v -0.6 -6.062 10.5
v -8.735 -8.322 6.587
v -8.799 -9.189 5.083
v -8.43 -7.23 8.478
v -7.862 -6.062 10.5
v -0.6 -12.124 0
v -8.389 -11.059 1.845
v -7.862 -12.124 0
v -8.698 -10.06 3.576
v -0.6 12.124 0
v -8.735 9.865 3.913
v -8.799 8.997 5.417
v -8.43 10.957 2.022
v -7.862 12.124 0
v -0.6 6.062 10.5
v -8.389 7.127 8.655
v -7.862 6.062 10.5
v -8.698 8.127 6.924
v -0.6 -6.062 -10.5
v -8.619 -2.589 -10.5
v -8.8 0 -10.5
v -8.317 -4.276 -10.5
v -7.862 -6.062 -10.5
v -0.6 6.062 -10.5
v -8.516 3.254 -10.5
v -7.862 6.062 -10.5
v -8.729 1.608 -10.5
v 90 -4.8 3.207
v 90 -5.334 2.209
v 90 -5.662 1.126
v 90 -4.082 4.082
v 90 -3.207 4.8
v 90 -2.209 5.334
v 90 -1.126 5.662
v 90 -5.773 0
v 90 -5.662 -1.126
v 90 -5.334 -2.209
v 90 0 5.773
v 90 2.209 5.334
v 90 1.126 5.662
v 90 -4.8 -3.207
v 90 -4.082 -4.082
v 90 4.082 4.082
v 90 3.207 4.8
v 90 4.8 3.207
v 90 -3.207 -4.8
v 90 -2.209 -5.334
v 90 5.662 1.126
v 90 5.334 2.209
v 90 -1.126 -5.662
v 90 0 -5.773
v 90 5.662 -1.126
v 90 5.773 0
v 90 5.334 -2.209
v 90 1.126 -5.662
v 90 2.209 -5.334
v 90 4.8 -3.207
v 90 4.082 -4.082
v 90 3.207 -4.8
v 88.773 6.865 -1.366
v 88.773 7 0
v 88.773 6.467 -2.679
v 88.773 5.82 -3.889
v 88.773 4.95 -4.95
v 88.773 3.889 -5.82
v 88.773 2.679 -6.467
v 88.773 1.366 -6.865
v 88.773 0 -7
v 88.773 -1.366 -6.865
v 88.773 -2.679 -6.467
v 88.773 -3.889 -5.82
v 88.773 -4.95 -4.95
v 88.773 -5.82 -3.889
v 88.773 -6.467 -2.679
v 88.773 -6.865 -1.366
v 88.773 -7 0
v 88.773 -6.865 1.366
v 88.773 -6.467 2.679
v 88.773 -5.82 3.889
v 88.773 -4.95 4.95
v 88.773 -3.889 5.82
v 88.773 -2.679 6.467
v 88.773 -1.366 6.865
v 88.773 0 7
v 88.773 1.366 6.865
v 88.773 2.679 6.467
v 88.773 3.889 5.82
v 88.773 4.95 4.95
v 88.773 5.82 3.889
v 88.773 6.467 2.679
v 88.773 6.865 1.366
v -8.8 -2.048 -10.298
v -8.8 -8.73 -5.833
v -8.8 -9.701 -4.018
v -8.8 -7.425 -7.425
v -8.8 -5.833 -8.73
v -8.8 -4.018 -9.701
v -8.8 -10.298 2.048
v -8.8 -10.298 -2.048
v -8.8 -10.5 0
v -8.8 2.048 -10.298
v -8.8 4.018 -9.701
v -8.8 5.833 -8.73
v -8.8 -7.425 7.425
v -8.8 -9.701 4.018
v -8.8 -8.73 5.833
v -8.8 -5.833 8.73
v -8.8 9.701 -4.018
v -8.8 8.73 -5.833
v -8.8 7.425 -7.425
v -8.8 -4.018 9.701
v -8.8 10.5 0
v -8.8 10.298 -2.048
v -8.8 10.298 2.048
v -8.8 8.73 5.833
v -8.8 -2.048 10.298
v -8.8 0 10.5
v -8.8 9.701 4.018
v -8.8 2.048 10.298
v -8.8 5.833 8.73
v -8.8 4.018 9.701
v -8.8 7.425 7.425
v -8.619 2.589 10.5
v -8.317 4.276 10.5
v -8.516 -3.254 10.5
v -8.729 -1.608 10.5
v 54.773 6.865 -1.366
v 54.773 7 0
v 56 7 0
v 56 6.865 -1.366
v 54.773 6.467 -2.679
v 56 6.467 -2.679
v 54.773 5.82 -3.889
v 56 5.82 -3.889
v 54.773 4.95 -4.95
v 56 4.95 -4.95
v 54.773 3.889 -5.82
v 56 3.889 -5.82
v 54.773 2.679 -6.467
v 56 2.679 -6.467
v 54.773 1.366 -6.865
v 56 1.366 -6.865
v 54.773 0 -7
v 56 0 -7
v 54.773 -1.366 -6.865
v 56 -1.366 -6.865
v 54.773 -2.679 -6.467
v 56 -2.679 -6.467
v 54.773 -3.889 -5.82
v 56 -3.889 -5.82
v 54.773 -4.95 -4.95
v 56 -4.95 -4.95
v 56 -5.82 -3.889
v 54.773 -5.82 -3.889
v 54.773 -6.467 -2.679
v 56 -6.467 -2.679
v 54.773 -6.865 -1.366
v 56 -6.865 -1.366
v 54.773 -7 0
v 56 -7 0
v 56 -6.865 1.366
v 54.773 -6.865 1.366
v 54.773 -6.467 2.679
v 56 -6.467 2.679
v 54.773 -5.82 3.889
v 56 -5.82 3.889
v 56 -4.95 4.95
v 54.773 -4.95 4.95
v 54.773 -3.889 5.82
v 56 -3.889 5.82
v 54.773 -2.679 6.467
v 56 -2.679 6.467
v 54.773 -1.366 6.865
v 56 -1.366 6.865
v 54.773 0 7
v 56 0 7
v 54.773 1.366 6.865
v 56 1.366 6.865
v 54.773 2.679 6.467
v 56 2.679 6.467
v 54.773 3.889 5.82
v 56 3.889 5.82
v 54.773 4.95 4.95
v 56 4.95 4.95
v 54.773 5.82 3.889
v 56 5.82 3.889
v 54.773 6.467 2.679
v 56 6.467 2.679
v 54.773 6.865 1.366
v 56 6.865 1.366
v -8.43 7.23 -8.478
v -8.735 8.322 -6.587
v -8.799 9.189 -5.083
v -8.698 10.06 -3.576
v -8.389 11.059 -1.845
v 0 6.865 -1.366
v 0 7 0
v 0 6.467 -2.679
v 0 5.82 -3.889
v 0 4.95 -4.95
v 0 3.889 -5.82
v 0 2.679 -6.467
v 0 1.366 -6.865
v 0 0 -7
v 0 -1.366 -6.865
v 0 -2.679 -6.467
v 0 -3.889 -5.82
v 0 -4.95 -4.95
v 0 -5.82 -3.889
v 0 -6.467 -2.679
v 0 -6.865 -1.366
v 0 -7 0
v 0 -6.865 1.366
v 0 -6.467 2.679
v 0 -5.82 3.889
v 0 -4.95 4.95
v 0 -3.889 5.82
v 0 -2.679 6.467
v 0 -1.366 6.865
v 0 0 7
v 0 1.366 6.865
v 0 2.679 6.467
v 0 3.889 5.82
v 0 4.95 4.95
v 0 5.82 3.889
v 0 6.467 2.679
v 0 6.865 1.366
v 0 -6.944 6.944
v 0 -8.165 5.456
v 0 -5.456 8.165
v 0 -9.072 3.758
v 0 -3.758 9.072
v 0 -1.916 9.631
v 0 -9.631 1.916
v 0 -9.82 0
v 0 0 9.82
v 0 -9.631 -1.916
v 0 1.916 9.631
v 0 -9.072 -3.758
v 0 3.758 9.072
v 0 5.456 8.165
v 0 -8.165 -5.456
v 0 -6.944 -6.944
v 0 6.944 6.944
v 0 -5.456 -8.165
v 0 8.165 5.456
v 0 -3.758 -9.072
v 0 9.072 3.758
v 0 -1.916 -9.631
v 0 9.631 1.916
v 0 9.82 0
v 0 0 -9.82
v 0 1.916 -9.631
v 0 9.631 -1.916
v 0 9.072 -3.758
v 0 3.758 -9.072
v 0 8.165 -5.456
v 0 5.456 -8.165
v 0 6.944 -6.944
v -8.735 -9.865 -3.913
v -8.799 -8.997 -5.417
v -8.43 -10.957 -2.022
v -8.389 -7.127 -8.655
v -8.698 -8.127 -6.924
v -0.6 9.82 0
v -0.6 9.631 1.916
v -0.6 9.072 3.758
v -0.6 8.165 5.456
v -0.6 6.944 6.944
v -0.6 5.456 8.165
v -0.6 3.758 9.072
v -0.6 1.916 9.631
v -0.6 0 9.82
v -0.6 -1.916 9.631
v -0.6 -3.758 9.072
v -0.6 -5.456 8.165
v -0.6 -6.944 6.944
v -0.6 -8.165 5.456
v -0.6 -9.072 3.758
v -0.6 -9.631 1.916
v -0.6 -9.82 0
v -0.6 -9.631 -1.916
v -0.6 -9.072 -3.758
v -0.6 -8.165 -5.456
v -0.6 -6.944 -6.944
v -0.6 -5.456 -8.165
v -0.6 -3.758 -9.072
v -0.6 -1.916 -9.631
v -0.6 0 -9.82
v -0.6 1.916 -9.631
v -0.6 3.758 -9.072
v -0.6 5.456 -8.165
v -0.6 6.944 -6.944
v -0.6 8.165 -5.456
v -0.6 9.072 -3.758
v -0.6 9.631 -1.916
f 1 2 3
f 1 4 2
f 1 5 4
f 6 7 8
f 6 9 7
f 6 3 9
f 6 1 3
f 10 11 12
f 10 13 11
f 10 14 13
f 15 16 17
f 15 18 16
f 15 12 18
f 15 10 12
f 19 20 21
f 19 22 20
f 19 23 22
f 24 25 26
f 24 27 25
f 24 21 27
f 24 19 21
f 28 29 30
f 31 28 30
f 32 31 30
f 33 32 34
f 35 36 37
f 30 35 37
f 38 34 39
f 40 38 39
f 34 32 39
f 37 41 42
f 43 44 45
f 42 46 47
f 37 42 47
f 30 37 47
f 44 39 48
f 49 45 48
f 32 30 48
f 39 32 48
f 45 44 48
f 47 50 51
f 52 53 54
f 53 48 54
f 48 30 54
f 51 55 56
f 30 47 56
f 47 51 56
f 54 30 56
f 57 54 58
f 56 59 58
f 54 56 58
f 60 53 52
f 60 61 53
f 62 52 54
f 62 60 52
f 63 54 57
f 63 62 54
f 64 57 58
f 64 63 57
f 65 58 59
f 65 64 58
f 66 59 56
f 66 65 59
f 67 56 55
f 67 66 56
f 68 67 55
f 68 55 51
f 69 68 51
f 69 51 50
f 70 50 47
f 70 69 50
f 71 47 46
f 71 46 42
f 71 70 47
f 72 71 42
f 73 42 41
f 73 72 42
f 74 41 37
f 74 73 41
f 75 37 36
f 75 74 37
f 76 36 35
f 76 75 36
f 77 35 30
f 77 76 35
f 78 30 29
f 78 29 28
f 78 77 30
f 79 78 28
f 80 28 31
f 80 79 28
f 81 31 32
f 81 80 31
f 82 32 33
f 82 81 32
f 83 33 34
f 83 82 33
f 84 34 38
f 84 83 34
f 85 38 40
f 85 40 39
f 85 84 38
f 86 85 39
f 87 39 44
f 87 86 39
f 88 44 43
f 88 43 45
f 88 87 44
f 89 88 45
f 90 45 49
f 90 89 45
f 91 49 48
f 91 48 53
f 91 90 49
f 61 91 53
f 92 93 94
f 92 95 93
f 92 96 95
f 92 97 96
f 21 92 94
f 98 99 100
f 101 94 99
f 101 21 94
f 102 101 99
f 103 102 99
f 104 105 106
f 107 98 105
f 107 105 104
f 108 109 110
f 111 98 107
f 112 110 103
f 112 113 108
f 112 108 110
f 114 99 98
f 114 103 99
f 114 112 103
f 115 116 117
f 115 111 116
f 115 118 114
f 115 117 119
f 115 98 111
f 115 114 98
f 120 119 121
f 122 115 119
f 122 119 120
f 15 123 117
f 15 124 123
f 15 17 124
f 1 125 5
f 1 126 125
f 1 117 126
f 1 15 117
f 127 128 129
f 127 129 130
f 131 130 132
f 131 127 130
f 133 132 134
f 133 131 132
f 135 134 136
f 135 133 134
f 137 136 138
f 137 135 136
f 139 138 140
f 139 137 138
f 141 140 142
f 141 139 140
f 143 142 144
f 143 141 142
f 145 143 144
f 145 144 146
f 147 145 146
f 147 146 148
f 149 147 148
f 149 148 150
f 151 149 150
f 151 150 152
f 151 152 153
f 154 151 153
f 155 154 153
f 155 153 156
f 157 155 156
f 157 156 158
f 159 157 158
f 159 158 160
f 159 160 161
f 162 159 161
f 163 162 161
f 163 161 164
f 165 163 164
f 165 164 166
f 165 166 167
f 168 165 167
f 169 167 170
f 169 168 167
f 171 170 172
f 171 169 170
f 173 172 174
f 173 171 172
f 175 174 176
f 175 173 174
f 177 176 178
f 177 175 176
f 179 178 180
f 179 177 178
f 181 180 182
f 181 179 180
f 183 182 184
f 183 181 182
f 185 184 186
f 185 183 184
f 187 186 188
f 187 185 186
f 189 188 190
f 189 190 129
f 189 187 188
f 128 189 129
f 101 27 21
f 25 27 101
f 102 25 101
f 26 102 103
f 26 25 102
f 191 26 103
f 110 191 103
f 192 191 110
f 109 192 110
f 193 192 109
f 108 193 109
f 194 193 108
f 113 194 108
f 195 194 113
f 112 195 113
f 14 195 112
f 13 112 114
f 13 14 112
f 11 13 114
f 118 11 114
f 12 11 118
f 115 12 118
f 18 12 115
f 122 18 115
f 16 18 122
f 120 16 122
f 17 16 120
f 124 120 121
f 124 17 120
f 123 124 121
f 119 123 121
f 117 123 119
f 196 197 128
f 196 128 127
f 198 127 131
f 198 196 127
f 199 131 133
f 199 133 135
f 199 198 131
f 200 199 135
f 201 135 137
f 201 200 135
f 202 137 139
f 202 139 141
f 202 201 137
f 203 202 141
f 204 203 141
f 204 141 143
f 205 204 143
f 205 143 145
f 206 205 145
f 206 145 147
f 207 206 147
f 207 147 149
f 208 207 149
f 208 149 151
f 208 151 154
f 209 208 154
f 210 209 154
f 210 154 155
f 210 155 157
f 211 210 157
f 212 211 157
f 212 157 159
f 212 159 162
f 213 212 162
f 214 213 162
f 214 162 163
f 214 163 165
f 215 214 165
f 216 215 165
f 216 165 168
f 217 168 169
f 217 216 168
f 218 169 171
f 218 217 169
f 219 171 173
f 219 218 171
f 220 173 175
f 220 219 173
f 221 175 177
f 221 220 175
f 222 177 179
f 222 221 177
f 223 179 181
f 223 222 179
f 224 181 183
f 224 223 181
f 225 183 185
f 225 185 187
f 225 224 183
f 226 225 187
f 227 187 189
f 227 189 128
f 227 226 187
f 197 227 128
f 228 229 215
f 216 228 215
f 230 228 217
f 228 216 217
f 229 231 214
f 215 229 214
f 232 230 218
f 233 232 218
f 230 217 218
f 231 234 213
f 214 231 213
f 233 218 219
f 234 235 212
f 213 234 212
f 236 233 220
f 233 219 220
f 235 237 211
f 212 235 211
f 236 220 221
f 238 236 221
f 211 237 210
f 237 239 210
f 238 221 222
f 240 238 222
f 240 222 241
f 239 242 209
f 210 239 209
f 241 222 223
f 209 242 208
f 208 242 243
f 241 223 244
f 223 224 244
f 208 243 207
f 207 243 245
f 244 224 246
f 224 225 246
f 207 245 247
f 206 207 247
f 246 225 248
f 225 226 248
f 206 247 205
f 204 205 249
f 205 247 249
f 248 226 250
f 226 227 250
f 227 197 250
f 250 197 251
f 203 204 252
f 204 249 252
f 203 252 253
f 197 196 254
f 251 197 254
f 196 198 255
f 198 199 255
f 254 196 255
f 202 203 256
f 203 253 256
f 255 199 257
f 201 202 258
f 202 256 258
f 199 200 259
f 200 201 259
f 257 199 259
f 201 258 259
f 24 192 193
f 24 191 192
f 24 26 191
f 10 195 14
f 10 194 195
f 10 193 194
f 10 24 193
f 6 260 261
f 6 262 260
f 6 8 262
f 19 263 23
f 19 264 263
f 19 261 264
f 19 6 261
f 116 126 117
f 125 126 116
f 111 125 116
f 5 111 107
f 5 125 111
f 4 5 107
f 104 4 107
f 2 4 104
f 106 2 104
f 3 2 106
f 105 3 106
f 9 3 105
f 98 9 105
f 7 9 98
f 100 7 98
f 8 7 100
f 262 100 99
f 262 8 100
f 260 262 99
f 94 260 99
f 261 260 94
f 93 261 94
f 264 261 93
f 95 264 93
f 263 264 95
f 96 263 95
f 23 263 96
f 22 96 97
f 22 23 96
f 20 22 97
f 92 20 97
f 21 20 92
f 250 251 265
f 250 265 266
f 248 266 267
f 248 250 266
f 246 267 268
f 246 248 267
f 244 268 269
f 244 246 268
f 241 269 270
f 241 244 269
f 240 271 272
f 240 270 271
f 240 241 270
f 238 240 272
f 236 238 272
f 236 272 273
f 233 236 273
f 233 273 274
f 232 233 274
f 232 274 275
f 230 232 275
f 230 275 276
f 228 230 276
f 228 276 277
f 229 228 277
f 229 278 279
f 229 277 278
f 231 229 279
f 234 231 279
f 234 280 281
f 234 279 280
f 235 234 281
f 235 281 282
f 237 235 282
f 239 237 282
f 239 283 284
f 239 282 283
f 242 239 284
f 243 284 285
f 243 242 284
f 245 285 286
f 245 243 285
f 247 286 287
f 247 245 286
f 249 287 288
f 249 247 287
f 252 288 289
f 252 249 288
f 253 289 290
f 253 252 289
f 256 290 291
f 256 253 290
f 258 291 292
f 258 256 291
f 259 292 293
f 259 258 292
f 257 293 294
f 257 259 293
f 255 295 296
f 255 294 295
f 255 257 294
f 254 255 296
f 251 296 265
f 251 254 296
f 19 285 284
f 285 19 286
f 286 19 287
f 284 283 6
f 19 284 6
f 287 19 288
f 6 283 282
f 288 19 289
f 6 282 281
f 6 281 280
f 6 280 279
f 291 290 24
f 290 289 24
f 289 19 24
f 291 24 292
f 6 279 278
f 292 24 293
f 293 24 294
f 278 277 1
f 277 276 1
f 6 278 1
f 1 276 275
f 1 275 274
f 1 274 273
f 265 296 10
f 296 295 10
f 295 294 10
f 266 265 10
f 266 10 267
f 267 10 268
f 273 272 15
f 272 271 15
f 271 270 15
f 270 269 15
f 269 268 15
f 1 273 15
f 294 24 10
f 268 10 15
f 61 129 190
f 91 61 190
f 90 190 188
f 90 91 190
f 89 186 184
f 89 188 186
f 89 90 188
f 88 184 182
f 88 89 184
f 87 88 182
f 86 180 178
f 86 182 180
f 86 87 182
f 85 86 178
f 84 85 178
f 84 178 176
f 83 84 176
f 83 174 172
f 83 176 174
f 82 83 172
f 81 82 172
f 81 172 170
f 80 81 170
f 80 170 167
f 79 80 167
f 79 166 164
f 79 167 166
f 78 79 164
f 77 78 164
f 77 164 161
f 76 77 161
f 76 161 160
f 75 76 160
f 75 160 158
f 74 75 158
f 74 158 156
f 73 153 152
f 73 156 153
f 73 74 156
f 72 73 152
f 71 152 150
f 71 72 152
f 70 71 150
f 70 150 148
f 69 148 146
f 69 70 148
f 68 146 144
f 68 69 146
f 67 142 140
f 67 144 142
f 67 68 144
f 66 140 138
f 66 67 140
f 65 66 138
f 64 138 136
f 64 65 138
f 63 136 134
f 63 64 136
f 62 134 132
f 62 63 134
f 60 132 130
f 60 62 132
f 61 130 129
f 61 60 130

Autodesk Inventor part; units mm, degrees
ref_plane "YZ Plane" through (0, 0, 0) normal (1, 0, 0) x (0, 1, 0)
ref_plane "XZ Plane" through (0, 0, 0) normal (0, 1, 0) x (-1, 0, 0)
sketch "Sketch1" plane through (0, 0, 0) normal (0, 0, 1) x (1, 0, 0)
  line L0 (0, 9.82) -> (0, 7)
  line L1 (56, 7) -> (90, 7)
  line L2 (90, 7) -> (90, 0)
  line L3 (90, 0) -> (-0.6001, 0)
  line L4 (-18.7201, 0) -> (108.12, 0) projected
  line L5 (-0.6001, 0) -> (-0.6001, 9.82)
  line L6 (-0.6001, 9.82) -> (0, 9.82)
  line L7 (56, 7) -> (54.773, 7)
  line L8 (54.773, 7) -> (0, 7)
  line L9 (0, -1.964) -> (0, 11.784) projected
  dimension "d0" = 90
  dimension "d1" = 34
  dimension "d2" = 14
  dimension "d9" = 0.6001
  dimension "d10" = 19.64
  dimension "d13" = 1.227
  dimension "d14" = 14
revolve "Body" add sketch "Sketch1" angle 360 about axis through (90, 0, 0) along (-1, 0, 0)
sketch "Sketch2" plane through (-0.6001, 0, 0) normal (-1, 0, 0) x (0, 0, 1)
  line L0 (0, 12.1244) -> (10.5, 6.0622)
  line L1 (10.5, 6.0622) -> (10.5, -6.0622)
  line L2 (10.5, -6.0622) -> (0, -12.1244)
  line L3 (0, -12.1244) -> (-10.5, -6.0622)
  line L4 (-10.5, -6.0622) -> (-10.5, 6.0622)
  line L5 (-10.5, 6.0622) -> (0, 12.1244)
  point P0 (0, 0)
  point P1 (0, 0)
  dimension "d11" = 21
extrude "Head" add sketch "Sketch2" along normal blind 8.2
sketch "Sketch4" plane through (0, 0, 0) normal (0, 0, 1) x (1, 0, 0)
  line L0 (-8.8001, 10.5) -> (-8.8001, 12.1244)
  line L1 (-8.8001, 12.1244) -> (-7.8623, 12.1244)
  line L2 (-7.8623, 12.1244) -> (-8.8001, 10.5)
  line L3 (-10.4401, 0) -> (1.0399, 0) projected
  line L4 (-0.6001, 12.1244) -> (-8.8001, 12.1244) projected
  line L5 (-8.8001, 6.0622) -> (-8.8001, 12.1244) projected
  dimension "d5" = 30
  dimension "d19" = 21
revolve "Chamfer1" cut sketch "Sketch4" angle 360 about axis through (-10, 0, 0) along (1, 0, 0)
thread "Thread" size "M14x2" class "6g" standard "ISO Metric profile" length 34
chamfer "Chamfer2" distance 1.2269 distance2 1.227 1 edges at (90, -7, 0) measured on face at (90, -1.3255, -1.9203)
ref_plane "Work Plane1" through (1.525, 0, 0) normal (0, 0, 1) x (1, 0, 0)
equation "\"d11\" = SW"
equation "\"d3\" = KOH - SD"
equation "\"d15\" = GEL"
equation "\"d6\" = -0.5 * SPD + 0.5 * GD"
equation "\"d0\" = NLG"
equation "\"d1\" = GEL"
equation "\"d2\" = GD"
equation "\"d10\" = SD2"
equation "\"d14\" = BDM"
equation "\"d5\" = ANG1"
equation "\"d19\" = SW0"
equation "\"NLG\" = 90"
equation "\"GD\" = NND"
equation "\"BDM\" = NND"
equation "\"KOH\" = 8.8"
equation "\"GEL\" = 34"
equation "\"SW\" = 21"
equation "\"SW0\" = SW"
equation "\"SPD\" = NND - 1.2269 * PTC"
equation "\"SD2\" = 19.64"
equation "\"SD\" = 0.6"
equation "\"ANG1\" = 30deg"
equation "\"GAL\" = 0.61345 * PTC"
equation "\"GUL\" = 0.61345 * PTC"
equation "\"RR\" = 0.6"
equation "\"GD1\" = THREADDIA - 1.2269 * PTC"
equation "\"THREADDIA\" = 14"
equation "\"SDH\" = SD2"
equation "\"TOA\" = 30deg"
equation "\"PTC\" = 2"
equation "\"NND\" = 14"
equation "\"E0\" = 1.155 * SW"
properties part number "ISO 4014 - M14 x 90" material "Stainless Steel, 440C"
